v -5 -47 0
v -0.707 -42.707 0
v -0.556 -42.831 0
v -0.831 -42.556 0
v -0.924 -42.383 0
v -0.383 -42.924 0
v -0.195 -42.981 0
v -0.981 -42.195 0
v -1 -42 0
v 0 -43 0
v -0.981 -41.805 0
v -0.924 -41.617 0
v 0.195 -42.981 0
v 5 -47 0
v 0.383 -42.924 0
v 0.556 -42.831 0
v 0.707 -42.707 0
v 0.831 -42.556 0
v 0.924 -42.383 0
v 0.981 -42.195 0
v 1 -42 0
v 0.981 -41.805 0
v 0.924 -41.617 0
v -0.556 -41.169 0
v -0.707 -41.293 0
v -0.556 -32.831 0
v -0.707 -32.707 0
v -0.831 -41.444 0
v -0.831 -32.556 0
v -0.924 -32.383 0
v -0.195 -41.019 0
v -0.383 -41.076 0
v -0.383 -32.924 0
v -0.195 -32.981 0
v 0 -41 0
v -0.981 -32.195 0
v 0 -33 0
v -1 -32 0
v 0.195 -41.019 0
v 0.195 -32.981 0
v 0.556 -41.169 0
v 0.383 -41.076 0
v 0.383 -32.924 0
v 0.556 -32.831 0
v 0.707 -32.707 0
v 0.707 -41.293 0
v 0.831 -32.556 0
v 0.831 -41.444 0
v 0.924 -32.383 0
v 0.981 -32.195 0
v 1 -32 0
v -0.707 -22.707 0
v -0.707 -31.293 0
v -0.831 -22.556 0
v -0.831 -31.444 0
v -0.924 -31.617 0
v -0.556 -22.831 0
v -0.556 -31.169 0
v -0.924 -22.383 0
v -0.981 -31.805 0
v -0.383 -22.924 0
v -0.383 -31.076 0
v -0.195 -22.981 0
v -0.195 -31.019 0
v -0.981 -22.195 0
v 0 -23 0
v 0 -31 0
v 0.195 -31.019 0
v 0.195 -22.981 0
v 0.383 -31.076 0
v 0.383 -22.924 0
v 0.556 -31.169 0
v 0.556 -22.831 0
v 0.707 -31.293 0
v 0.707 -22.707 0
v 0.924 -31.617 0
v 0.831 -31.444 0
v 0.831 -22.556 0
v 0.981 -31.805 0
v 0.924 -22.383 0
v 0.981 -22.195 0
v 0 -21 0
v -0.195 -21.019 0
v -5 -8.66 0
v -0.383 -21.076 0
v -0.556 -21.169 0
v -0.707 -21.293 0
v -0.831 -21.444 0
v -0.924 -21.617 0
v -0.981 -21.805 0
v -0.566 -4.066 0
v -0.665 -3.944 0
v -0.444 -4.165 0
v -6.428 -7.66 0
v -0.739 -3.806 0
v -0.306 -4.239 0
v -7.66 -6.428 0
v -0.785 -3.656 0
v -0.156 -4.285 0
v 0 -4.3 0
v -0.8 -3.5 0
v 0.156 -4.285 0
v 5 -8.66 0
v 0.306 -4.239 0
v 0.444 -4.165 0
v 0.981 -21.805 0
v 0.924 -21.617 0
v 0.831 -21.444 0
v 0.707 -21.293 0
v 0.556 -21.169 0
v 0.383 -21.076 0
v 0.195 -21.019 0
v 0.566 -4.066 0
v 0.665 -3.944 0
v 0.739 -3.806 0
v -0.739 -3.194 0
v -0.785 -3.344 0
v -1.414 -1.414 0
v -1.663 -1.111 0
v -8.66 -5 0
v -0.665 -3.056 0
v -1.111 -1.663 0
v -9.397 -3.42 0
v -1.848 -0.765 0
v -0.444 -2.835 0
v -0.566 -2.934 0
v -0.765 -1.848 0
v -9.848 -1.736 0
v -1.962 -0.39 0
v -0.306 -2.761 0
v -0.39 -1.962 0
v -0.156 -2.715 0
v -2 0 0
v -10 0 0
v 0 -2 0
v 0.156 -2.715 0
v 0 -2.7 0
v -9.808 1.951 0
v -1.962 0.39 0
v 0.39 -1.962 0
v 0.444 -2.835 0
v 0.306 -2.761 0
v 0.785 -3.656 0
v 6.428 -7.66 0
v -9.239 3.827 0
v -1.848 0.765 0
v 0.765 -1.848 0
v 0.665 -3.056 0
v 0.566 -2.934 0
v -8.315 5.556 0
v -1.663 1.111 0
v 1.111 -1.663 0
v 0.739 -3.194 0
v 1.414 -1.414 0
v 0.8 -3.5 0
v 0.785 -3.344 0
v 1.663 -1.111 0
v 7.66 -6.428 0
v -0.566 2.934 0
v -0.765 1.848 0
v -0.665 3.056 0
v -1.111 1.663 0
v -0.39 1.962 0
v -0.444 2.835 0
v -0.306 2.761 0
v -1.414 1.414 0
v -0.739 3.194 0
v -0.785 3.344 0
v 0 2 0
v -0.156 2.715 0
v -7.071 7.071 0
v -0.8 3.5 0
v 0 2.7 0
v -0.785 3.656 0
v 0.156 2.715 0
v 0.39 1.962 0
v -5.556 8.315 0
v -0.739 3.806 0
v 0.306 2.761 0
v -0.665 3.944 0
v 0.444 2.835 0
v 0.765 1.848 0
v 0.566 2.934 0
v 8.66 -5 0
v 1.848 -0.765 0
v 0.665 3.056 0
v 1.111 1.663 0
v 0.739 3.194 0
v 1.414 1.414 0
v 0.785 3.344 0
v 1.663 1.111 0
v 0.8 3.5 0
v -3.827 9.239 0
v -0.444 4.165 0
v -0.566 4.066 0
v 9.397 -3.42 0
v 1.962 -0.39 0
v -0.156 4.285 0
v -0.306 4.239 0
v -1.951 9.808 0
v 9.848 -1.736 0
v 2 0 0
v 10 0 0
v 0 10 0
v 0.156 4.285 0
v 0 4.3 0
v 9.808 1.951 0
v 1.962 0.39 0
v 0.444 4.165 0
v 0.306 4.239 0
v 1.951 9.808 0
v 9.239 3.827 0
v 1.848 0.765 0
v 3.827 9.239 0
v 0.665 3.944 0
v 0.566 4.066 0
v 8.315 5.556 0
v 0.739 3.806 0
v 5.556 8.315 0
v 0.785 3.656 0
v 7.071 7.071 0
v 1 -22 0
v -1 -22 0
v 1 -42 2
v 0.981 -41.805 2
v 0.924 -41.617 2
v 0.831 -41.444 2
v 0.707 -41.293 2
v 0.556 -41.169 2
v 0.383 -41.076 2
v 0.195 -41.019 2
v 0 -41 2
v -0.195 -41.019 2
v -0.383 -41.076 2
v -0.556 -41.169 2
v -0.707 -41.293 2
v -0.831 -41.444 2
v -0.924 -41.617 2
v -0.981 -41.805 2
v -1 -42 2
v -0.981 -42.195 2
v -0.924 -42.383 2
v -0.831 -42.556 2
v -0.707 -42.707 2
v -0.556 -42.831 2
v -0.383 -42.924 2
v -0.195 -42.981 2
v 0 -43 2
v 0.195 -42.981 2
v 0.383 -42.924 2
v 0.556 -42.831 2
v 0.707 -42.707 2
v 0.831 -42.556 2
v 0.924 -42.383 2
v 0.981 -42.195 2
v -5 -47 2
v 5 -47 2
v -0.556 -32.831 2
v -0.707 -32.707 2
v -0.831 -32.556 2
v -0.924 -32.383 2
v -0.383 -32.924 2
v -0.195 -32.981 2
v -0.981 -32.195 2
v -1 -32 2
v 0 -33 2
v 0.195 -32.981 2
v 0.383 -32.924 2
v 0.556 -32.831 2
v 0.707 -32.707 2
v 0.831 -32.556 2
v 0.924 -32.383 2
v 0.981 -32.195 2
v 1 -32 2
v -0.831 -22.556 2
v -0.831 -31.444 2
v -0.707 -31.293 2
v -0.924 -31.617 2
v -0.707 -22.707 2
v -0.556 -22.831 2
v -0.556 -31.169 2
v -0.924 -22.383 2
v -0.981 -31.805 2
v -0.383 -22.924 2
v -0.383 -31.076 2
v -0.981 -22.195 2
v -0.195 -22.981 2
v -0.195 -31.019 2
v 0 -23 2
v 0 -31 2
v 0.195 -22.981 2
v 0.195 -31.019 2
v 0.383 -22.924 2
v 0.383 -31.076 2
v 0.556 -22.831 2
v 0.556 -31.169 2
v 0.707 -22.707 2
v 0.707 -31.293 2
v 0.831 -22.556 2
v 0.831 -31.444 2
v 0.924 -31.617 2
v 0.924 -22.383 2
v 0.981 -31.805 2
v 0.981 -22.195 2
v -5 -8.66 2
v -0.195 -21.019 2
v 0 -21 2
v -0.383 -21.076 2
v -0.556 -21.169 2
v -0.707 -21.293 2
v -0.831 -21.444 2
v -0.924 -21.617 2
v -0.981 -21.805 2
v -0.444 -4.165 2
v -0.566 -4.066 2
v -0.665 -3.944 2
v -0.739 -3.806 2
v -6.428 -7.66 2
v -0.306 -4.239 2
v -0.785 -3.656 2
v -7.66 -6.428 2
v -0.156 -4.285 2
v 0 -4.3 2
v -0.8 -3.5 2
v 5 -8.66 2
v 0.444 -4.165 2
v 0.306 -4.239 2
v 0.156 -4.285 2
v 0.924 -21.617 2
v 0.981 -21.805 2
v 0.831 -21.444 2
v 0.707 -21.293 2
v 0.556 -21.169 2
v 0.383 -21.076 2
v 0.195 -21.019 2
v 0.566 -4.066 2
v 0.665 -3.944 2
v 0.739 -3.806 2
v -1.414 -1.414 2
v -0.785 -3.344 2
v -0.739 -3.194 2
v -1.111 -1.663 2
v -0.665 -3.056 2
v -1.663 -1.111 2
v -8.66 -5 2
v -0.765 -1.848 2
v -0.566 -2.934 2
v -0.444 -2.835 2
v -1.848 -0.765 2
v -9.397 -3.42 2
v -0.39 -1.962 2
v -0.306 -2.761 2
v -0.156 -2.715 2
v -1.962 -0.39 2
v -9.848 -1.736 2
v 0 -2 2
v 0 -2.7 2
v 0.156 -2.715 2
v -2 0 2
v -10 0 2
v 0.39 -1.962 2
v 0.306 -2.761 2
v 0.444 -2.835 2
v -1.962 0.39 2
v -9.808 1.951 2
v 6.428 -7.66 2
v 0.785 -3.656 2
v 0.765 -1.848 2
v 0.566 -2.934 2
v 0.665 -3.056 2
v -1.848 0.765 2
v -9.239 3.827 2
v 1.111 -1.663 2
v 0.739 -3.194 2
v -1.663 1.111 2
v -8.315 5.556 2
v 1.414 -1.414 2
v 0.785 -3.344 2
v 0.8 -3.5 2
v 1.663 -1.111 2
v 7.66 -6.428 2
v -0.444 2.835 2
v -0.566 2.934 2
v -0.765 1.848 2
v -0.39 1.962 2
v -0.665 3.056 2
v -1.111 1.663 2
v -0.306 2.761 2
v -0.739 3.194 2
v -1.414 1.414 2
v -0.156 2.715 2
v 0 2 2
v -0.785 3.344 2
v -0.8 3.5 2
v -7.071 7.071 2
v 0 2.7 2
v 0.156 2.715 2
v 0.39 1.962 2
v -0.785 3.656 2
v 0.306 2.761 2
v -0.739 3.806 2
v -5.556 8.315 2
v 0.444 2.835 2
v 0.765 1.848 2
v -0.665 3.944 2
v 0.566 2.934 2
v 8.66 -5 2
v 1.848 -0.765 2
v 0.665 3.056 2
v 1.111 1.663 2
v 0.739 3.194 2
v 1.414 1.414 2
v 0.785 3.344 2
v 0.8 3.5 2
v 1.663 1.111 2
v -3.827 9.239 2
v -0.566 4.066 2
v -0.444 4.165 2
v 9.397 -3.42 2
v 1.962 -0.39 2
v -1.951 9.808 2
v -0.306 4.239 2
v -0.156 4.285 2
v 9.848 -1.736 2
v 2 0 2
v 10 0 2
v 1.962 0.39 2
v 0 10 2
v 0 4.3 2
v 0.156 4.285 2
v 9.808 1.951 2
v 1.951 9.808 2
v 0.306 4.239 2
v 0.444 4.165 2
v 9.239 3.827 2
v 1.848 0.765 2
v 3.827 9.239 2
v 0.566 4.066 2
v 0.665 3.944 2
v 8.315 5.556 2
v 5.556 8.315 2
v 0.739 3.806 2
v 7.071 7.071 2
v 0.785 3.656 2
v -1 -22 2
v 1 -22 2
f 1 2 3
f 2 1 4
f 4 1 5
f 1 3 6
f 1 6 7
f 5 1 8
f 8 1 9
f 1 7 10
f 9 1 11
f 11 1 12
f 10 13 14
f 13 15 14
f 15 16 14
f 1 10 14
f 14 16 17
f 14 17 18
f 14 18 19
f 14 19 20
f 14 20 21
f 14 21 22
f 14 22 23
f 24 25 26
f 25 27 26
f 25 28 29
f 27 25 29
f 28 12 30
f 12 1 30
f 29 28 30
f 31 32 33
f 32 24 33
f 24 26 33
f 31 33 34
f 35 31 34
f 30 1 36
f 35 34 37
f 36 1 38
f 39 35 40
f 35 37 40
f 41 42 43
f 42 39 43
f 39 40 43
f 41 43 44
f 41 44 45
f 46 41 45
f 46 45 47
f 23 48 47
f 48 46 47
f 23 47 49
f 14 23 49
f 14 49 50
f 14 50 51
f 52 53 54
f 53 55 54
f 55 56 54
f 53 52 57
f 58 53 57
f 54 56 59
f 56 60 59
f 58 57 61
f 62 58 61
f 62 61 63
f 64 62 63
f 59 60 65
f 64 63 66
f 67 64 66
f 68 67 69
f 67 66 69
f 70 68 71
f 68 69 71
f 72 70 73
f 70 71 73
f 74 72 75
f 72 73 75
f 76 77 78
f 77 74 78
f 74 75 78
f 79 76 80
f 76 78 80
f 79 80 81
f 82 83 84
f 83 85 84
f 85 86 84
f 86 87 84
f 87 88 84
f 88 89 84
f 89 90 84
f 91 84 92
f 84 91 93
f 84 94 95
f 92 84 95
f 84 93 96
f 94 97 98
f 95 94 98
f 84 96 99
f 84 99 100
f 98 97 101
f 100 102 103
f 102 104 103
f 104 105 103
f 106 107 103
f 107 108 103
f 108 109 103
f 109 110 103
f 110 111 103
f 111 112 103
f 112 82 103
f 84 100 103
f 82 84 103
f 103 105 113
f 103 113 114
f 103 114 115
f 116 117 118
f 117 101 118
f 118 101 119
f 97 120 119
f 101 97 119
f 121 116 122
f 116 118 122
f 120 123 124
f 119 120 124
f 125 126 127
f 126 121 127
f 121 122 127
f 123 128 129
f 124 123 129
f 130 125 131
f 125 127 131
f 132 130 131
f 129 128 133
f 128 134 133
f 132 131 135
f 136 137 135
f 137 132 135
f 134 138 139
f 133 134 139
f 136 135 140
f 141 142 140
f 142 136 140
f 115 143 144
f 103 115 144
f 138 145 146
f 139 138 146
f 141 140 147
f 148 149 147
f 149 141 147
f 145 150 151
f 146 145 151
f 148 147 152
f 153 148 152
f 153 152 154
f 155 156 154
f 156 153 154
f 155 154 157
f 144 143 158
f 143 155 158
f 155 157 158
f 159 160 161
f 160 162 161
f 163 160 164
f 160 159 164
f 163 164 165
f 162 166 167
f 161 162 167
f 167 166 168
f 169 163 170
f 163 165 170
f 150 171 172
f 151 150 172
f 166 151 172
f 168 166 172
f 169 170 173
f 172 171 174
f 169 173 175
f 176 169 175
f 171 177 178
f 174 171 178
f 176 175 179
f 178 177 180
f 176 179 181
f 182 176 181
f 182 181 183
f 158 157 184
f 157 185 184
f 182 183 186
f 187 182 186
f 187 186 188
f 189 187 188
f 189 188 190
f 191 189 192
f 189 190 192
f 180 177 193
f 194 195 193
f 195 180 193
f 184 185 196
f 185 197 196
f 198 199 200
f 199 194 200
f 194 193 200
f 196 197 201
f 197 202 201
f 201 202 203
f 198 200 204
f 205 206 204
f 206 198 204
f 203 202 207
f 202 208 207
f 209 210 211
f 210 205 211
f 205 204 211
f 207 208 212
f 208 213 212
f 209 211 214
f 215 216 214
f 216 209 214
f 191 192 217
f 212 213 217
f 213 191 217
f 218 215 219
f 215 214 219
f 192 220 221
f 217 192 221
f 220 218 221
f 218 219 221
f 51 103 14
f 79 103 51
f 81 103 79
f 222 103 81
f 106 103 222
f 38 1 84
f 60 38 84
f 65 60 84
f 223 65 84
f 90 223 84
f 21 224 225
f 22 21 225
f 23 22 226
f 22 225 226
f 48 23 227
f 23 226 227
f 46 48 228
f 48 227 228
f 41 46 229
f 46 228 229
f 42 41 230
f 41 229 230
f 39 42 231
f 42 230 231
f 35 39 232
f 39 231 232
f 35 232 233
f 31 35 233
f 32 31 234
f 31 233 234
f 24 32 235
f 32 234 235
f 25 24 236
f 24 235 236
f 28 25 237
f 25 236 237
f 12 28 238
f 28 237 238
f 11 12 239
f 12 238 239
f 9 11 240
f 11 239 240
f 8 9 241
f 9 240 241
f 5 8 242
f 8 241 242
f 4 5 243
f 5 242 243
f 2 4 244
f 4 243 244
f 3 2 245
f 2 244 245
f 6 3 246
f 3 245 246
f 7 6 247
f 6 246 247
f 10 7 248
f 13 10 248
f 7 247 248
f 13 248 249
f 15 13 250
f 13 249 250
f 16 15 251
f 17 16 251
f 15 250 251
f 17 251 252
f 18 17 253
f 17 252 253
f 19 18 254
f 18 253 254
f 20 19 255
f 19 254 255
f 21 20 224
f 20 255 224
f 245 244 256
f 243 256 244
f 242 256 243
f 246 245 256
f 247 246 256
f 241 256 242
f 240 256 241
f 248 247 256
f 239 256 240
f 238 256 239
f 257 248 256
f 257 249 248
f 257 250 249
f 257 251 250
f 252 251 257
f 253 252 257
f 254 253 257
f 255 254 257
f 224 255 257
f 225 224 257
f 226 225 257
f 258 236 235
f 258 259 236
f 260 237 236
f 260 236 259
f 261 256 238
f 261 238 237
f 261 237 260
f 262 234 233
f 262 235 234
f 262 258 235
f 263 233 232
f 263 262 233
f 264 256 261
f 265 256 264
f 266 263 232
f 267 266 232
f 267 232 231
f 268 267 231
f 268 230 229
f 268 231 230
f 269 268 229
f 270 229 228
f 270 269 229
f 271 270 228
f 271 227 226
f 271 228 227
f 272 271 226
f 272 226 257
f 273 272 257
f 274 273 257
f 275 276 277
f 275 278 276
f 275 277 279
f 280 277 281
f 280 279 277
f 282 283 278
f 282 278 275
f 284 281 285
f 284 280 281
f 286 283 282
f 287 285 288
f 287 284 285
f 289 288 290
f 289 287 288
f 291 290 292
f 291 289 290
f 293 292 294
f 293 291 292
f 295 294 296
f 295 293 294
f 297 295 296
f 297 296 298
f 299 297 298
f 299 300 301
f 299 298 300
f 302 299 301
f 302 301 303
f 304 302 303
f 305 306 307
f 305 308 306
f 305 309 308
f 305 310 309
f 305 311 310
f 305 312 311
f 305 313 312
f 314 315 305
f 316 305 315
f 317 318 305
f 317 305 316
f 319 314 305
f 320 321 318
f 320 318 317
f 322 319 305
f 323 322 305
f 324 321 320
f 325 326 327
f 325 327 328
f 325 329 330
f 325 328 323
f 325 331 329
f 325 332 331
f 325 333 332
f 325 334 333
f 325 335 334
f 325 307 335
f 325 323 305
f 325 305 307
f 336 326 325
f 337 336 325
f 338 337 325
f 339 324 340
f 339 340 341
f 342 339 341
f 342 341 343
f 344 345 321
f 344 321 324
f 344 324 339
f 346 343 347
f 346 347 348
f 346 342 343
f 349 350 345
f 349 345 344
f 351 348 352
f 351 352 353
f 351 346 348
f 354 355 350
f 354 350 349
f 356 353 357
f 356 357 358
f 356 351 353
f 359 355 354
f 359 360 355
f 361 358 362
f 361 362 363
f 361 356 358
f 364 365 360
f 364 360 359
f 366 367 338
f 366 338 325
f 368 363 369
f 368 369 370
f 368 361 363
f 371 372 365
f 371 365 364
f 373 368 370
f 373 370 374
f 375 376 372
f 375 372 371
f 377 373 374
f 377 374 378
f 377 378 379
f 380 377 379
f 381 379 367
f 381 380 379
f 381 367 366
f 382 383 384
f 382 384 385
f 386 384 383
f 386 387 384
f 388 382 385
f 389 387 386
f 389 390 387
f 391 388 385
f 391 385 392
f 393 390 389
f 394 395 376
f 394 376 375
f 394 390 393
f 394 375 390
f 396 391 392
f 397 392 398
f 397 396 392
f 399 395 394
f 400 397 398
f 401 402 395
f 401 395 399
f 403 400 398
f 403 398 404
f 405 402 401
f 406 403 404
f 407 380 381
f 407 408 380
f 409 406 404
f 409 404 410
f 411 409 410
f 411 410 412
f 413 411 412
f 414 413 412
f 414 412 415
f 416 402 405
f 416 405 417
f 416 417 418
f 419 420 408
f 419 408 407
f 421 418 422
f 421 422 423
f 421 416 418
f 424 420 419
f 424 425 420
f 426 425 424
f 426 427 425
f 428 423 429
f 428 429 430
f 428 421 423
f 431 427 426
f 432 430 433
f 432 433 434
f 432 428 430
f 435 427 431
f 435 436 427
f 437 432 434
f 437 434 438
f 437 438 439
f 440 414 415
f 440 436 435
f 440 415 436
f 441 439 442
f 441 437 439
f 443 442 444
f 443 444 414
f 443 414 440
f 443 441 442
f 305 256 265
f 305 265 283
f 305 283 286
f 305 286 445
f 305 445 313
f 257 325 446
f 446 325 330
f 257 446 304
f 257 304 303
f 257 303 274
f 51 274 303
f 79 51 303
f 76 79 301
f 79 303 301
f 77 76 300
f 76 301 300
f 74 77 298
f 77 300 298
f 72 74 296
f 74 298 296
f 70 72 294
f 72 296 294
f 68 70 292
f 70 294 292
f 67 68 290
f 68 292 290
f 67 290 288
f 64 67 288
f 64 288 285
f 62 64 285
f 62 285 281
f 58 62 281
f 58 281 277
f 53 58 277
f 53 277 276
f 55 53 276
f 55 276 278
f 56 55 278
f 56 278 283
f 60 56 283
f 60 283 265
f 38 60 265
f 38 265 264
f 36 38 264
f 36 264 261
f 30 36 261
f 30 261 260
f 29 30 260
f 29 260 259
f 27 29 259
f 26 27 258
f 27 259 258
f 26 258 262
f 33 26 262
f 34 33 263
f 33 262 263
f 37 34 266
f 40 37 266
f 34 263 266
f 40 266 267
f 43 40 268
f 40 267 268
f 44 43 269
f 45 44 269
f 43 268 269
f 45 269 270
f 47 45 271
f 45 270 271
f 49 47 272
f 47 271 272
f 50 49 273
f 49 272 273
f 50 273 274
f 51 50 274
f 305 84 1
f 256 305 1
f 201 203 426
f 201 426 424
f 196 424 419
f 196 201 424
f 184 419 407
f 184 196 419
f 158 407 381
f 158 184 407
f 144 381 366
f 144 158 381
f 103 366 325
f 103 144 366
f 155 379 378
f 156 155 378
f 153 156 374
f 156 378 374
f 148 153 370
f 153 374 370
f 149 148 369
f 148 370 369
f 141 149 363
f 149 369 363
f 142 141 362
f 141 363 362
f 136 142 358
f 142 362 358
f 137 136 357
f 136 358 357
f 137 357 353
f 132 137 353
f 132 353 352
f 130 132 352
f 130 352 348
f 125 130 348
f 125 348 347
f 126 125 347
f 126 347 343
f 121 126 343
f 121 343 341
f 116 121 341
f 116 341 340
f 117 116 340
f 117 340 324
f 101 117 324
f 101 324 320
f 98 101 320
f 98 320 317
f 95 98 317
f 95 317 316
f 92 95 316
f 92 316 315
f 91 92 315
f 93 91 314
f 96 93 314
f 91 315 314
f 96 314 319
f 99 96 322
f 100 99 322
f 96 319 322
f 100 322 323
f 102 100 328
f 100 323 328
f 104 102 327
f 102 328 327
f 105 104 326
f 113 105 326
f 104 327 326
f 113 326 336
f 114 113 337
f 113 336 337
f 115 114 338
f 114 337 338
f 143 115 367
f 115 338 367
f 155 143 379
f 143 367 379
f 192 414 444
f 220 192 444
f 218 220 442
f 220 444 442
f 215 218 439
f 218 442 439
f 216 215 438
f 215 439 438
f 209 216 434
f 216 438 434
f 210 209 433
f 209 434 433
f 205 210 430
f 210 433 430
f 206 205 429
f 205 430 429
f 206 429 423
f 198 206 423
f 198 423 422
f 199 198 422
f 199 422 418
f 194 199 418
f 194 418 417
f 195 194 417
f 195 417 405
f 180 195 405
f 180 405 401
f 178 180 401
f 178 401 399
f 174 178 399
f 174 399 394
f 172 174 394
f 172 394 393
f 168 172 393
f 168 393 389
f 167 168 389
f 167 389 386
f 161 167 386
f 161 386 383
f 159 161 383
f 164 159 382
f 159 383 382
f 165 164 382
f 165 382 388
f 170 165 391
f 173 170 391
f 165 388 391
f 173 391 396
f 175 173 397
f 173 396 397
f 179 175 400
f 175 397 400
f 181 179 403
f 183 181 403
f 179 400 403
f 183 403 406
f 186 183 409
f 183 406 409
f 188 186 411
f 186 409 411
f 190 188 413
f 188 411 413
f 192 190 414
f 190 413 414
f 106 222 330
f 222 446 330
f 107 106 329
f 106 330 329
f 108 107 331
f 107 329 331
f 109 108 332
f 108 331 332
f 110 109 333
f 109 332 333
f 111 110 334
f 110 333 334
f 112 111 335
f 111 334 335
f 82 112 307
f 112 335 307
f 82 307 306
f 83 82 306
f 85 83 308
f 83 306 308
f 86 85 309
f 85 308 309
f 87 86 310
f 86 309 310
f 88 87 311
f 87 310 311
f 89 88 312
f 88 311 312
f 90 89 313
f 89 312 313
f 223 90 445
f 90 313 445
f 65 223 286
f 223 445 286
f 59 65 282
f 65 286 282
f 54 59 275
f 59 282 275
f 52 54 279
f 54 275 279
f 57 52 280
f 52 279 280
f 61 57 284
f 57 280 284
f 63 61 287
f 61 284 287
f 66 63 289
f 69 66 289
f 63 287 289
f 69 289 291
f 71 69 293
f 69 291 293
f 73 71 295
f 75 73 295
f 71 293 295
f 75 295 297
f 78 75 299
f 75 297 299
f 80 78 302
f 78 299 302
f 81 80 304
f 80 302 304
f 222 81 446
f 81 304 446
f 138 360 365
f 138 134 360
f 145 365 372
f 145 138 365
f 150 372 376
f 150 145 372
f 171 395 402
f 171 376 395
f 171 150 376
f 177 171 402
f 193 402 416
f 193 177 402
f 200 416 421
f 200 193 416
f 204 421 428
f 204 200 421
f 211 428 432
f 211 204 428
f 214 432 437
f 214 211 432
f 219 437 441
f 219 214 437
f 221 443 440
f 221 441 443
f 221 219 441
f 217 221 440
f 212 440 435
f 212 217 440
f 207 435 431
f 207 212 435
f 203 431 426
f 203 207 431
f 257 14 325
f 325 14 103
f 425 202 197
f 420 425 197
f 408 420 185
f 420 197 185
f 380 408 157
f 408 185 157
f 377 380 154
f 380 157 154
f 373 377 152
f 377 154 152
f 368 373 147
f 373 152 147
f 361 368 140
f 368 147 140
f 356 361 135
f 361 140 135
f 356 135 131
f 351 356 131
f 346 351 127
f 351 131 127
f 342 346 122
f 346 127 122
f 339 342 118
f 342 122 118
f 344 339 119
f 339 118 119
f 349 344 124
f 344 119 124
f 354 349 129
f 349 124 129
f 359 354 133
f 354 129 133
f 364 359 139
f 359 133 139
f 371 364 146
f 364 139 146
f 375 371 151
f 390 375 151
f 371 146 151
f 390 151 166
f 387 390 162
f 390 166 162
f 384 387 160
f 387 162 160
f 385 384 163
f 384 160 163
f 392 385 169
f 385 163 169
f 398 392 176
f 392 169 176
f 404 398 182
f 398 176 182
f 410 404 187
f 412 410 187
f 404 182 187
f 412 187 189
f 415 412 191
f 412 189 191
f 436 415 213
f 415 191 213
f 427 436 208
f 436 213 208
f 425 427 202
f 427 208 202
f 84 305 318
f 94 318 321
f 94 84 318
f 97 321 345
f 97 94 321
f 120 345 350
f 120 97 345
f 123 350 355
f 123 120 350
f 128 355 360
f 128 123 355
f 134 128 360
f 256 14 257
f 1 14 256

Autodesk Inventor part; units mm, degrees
ref_plane "YZ Plane" through (0, 0, 0) normal (1, 0, 0) x (0, 1, 0)
ref_plane "XZ Plane" through (0, 0, 0) normal (0, 1, 0) x (-1, 0, 0)
ref_plane "XY Plane" through (0, 0, 0) normal (0, 0, 1) x (1, 0, 0)
sketch "スケッチ1" plane through (0, 0, 0) normal (0, 0, 1) x (1, 0, 0)
  circle A0 centre (0, 0) radius 10
  circle A1 centre (0, 0) radius 2
  line L0 (0, -2) -> (0, -47)
  line L1 (10, 0) -> (10, -47)
  line L2 (10, -47) -> (-10, -47)
  line L3 (-10, -47) -> (-10, 0)
  circle A2 centre (0, -32) radius 1
  circle A3 centre (0, -42) radius 1
  circle A4 centre (0, -22) radius 1
  dimension "d1" = 4
  dimension "d0" = 20
  dimension "d2" = 45
  dimension "d9" = 2
  dimension "d10" = 2
  dimension "d11" = 2
extrude "押し出し1" add sketch "スケッチ1" along normal blind 2
sketch "スケッチ2" plane through (0, 0, 2) normal (0, 0, 1) x (1, 0, 0)
  circle A0 centre (0, -32) radius 1
  circle A1 centre (0, -22) radius 1
  circle A2 centre (0, -42) radius 1
  point P0 (0, 0)
  dimension "d12" = 2
  dimension "d13" = 2
  dimension "d14" = 2
extrude "押し出し2" cut sketch "スケッチ2" against normal blind 10
sketch "スケッチ3" plane through (0, 0, 0) normal (0, 0, -1) x (-1, 0, 0)
  line L0 (10, -47) -> (-10, -47)
  line L1 (10, -47) -> (5, -47)
  circle A0 centre (0, 0) radius 10
  line L2 (5, -47) -> (5, -8.660254)
  line L3 (10, 0) -> (10, -47)
  line L4 (10, -47) -> (10, 0)
  line L5 (-10, -47) -> (-10, 0)
  line L6 (-10, 0) -> (-10, -47)
  line L7 (-10, -47) -> (-5, -47)
  line L8 (-5, -47) -> (-5, -8.660254)
  dimension "d17" = 5
  dimension "d18" = 5
sketch "スケッチ3 outline for 押し出し3" plane through (0, 0, 0) normal (0, 0, -1) x (-1, 0, 0)
  line L0 (-5, -47) -> (-5, -8.660254)
  line L1 (-10, -47) -> (-5, -47)
  line L2 (-10, 0) -> (-10, -47)
  arc A0 (-5, -8.660254) -> (-10, 0) centre (0, 0) cw
  line L3 (10, -47) -> (10, 0)
  line L4 (5, -47) -> (10, -47)
  line L5 (5, -8.660254) -> (5, -47)
  arc A1 (10, 0) -> (5, -8.660254) centre (0, 0) cw
extrude "押し出し3" cut sketch "スケッチ3 outline for 押し出し3" against normal blind 10
sketch "スケッチ5" plane through (0, 0, 2) normal (0, 0, 1) x (1, 0, 0)
  circle A0 centre (0, 0) radius 3.5
  circle A1 centre (0, 3.5) radius 0.8
  circle A2 centre (0, -3.5) radius 0.8
  dimension "d31" = 7
  dimension "d32" = 1.6
  dimension "d33" = 1.6
extrude "押し出し5" cut sketch "スケッチ5" against normal blind 10 contours A1 A0 | A0 A1 | A2 A0 | A0 A2
thread "ねじ3" size "M1.6x0.35" class "6H" standard "ANSI Metric M Profile" full length
thread "ねじ4" size "M1.6x0.35" class "6H" standard "ANSI Metric M Profile" full length
properties part number "cutter_board"
